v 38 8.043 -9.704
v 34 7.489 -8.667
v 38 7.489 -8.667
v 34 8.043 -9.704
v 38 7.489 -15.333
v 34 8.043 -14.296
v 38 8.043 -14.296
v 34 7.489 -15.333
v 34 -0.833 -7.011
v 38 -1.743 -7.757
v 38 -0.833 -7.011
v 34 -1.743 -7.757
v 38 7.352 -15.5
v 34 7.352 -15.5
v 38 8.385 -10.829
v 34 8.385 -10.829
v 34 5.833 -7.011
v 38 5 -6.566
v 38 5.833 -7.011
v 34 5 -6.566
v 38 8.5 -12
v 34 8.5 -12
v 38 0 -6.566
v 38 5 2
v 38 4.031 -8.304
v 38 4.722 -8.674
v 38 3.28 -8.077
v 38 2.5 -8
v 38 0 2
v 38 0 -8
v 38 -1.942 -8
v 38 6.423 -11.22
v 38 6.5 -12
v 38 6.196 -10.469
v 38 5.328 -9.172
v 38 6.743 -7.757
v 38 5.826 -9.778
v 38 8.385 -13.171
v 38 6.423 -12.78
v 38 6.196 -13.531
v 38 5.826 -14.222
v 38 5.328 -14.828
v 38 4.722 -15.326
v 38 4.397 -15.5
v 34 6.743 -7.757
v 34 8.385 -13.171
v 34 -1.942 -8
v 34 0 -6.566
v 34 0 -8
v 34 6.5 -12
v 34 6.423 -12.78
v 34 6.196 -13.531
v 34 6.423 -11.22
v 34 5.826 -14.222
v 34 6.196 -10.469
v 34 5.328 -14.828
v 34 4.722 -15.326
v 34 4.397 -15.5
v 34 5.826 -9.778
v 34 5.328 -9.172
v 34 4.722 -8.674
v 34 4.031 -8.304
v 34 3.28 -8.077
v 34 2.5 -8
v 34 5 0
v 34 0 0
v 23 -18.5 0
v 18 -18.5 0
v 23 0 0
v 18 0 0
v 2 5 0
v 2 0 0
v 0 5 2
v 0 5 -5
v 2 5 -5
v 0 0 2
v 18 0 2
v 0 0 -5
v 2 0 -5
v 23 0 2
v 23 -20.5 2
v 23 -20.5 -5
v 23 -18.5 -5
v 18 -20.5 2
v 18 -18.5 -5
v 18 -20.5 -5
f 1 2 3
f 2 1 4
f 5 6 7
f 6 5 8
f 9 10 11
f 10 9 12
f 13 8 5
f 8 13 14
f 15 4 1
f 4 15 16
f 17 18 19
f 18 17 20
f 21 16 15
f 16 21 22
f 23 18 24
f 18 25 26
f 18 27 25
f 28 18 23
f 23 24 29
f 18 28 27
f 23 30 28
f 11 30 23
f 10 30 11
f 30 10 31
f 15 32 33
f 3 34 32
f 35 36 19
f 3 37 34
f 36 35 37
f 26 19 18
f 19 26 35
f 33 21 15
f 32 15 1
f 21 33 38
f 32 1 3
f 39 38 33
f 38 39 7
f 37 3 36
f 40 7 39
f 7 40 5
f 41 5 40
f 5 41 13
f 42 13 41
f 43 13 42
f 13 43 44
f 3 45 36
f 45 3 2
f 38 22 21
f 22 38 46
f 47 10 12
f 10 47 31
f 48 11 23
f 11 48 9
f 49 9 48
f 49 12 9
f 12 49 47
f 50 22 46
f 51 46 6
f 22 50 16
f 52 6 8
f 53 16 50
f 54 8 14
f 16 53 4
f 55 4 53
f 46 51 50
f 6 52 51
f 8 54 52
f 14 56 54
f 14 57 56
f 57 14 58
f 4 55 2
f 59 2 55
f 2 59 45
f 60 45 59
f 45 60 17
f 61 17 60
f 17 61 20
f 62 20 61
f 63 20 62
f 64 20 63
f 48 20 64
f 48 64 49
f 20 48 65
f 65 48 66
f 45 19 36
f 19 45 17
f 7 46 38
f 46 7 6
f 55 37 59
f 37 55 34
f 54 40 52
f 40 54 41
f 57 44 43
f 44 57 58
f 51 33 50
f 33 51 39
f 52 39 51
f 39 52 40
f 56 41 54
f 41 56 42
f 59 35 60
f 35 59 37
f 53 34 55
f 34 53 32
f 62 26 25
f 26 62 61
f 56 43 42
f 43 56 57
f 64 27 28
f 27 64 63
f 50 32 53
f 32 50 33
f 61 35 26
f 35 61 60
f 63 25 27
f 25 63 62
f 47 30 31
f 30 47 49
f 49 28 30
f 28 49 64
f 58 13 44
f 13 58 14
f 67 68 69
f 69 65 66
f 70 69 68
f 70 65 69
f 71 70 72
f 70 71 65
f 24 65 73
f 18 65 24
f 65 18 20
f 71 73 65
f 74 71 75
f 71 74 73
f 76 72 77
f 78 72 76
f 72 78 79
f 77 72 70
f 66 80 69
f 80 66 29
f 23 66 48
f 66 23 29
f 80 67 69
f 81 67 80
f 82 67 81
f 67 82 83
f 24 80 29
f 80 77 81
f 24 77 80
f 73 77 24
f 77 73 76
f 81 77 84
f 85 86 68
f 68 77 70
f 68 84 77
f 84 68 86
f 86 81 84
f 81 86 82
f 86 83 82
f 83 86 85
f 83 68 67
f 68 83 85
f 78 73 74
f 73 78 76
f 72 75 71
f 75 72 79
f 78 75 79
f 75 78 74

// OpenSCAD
$fn=32;

cyl=4;

// lang X
cube([34+cyl,5,2]);
// nedoverstart 
translate([0,0,-5])
    cube([2,5,5]);
// nedoverslutt
translate([34,0,-8]) {
    cube([cyl,5,8]);
    rotate([0,90,0]) {
        translate([4,2.5,0]) {
            difference() {
                cylinder(d=12,h=cyl);
                cylinder(d=8,h=cyl);
                translate([-4,-6,-0]) {
                    cube([10,6,cyl]);
                }
                translate([3.5,-5,0]) {
                    cube([6,11,cyl]);
                }
            }
        }
    }
}
// venstre
translate([18,-20.5,0]) {
    cube([5,20.5,2]);
    //nedovervenstre
    translate([0,0,-5]) {
        cube([5,2,5]);
    }
}
